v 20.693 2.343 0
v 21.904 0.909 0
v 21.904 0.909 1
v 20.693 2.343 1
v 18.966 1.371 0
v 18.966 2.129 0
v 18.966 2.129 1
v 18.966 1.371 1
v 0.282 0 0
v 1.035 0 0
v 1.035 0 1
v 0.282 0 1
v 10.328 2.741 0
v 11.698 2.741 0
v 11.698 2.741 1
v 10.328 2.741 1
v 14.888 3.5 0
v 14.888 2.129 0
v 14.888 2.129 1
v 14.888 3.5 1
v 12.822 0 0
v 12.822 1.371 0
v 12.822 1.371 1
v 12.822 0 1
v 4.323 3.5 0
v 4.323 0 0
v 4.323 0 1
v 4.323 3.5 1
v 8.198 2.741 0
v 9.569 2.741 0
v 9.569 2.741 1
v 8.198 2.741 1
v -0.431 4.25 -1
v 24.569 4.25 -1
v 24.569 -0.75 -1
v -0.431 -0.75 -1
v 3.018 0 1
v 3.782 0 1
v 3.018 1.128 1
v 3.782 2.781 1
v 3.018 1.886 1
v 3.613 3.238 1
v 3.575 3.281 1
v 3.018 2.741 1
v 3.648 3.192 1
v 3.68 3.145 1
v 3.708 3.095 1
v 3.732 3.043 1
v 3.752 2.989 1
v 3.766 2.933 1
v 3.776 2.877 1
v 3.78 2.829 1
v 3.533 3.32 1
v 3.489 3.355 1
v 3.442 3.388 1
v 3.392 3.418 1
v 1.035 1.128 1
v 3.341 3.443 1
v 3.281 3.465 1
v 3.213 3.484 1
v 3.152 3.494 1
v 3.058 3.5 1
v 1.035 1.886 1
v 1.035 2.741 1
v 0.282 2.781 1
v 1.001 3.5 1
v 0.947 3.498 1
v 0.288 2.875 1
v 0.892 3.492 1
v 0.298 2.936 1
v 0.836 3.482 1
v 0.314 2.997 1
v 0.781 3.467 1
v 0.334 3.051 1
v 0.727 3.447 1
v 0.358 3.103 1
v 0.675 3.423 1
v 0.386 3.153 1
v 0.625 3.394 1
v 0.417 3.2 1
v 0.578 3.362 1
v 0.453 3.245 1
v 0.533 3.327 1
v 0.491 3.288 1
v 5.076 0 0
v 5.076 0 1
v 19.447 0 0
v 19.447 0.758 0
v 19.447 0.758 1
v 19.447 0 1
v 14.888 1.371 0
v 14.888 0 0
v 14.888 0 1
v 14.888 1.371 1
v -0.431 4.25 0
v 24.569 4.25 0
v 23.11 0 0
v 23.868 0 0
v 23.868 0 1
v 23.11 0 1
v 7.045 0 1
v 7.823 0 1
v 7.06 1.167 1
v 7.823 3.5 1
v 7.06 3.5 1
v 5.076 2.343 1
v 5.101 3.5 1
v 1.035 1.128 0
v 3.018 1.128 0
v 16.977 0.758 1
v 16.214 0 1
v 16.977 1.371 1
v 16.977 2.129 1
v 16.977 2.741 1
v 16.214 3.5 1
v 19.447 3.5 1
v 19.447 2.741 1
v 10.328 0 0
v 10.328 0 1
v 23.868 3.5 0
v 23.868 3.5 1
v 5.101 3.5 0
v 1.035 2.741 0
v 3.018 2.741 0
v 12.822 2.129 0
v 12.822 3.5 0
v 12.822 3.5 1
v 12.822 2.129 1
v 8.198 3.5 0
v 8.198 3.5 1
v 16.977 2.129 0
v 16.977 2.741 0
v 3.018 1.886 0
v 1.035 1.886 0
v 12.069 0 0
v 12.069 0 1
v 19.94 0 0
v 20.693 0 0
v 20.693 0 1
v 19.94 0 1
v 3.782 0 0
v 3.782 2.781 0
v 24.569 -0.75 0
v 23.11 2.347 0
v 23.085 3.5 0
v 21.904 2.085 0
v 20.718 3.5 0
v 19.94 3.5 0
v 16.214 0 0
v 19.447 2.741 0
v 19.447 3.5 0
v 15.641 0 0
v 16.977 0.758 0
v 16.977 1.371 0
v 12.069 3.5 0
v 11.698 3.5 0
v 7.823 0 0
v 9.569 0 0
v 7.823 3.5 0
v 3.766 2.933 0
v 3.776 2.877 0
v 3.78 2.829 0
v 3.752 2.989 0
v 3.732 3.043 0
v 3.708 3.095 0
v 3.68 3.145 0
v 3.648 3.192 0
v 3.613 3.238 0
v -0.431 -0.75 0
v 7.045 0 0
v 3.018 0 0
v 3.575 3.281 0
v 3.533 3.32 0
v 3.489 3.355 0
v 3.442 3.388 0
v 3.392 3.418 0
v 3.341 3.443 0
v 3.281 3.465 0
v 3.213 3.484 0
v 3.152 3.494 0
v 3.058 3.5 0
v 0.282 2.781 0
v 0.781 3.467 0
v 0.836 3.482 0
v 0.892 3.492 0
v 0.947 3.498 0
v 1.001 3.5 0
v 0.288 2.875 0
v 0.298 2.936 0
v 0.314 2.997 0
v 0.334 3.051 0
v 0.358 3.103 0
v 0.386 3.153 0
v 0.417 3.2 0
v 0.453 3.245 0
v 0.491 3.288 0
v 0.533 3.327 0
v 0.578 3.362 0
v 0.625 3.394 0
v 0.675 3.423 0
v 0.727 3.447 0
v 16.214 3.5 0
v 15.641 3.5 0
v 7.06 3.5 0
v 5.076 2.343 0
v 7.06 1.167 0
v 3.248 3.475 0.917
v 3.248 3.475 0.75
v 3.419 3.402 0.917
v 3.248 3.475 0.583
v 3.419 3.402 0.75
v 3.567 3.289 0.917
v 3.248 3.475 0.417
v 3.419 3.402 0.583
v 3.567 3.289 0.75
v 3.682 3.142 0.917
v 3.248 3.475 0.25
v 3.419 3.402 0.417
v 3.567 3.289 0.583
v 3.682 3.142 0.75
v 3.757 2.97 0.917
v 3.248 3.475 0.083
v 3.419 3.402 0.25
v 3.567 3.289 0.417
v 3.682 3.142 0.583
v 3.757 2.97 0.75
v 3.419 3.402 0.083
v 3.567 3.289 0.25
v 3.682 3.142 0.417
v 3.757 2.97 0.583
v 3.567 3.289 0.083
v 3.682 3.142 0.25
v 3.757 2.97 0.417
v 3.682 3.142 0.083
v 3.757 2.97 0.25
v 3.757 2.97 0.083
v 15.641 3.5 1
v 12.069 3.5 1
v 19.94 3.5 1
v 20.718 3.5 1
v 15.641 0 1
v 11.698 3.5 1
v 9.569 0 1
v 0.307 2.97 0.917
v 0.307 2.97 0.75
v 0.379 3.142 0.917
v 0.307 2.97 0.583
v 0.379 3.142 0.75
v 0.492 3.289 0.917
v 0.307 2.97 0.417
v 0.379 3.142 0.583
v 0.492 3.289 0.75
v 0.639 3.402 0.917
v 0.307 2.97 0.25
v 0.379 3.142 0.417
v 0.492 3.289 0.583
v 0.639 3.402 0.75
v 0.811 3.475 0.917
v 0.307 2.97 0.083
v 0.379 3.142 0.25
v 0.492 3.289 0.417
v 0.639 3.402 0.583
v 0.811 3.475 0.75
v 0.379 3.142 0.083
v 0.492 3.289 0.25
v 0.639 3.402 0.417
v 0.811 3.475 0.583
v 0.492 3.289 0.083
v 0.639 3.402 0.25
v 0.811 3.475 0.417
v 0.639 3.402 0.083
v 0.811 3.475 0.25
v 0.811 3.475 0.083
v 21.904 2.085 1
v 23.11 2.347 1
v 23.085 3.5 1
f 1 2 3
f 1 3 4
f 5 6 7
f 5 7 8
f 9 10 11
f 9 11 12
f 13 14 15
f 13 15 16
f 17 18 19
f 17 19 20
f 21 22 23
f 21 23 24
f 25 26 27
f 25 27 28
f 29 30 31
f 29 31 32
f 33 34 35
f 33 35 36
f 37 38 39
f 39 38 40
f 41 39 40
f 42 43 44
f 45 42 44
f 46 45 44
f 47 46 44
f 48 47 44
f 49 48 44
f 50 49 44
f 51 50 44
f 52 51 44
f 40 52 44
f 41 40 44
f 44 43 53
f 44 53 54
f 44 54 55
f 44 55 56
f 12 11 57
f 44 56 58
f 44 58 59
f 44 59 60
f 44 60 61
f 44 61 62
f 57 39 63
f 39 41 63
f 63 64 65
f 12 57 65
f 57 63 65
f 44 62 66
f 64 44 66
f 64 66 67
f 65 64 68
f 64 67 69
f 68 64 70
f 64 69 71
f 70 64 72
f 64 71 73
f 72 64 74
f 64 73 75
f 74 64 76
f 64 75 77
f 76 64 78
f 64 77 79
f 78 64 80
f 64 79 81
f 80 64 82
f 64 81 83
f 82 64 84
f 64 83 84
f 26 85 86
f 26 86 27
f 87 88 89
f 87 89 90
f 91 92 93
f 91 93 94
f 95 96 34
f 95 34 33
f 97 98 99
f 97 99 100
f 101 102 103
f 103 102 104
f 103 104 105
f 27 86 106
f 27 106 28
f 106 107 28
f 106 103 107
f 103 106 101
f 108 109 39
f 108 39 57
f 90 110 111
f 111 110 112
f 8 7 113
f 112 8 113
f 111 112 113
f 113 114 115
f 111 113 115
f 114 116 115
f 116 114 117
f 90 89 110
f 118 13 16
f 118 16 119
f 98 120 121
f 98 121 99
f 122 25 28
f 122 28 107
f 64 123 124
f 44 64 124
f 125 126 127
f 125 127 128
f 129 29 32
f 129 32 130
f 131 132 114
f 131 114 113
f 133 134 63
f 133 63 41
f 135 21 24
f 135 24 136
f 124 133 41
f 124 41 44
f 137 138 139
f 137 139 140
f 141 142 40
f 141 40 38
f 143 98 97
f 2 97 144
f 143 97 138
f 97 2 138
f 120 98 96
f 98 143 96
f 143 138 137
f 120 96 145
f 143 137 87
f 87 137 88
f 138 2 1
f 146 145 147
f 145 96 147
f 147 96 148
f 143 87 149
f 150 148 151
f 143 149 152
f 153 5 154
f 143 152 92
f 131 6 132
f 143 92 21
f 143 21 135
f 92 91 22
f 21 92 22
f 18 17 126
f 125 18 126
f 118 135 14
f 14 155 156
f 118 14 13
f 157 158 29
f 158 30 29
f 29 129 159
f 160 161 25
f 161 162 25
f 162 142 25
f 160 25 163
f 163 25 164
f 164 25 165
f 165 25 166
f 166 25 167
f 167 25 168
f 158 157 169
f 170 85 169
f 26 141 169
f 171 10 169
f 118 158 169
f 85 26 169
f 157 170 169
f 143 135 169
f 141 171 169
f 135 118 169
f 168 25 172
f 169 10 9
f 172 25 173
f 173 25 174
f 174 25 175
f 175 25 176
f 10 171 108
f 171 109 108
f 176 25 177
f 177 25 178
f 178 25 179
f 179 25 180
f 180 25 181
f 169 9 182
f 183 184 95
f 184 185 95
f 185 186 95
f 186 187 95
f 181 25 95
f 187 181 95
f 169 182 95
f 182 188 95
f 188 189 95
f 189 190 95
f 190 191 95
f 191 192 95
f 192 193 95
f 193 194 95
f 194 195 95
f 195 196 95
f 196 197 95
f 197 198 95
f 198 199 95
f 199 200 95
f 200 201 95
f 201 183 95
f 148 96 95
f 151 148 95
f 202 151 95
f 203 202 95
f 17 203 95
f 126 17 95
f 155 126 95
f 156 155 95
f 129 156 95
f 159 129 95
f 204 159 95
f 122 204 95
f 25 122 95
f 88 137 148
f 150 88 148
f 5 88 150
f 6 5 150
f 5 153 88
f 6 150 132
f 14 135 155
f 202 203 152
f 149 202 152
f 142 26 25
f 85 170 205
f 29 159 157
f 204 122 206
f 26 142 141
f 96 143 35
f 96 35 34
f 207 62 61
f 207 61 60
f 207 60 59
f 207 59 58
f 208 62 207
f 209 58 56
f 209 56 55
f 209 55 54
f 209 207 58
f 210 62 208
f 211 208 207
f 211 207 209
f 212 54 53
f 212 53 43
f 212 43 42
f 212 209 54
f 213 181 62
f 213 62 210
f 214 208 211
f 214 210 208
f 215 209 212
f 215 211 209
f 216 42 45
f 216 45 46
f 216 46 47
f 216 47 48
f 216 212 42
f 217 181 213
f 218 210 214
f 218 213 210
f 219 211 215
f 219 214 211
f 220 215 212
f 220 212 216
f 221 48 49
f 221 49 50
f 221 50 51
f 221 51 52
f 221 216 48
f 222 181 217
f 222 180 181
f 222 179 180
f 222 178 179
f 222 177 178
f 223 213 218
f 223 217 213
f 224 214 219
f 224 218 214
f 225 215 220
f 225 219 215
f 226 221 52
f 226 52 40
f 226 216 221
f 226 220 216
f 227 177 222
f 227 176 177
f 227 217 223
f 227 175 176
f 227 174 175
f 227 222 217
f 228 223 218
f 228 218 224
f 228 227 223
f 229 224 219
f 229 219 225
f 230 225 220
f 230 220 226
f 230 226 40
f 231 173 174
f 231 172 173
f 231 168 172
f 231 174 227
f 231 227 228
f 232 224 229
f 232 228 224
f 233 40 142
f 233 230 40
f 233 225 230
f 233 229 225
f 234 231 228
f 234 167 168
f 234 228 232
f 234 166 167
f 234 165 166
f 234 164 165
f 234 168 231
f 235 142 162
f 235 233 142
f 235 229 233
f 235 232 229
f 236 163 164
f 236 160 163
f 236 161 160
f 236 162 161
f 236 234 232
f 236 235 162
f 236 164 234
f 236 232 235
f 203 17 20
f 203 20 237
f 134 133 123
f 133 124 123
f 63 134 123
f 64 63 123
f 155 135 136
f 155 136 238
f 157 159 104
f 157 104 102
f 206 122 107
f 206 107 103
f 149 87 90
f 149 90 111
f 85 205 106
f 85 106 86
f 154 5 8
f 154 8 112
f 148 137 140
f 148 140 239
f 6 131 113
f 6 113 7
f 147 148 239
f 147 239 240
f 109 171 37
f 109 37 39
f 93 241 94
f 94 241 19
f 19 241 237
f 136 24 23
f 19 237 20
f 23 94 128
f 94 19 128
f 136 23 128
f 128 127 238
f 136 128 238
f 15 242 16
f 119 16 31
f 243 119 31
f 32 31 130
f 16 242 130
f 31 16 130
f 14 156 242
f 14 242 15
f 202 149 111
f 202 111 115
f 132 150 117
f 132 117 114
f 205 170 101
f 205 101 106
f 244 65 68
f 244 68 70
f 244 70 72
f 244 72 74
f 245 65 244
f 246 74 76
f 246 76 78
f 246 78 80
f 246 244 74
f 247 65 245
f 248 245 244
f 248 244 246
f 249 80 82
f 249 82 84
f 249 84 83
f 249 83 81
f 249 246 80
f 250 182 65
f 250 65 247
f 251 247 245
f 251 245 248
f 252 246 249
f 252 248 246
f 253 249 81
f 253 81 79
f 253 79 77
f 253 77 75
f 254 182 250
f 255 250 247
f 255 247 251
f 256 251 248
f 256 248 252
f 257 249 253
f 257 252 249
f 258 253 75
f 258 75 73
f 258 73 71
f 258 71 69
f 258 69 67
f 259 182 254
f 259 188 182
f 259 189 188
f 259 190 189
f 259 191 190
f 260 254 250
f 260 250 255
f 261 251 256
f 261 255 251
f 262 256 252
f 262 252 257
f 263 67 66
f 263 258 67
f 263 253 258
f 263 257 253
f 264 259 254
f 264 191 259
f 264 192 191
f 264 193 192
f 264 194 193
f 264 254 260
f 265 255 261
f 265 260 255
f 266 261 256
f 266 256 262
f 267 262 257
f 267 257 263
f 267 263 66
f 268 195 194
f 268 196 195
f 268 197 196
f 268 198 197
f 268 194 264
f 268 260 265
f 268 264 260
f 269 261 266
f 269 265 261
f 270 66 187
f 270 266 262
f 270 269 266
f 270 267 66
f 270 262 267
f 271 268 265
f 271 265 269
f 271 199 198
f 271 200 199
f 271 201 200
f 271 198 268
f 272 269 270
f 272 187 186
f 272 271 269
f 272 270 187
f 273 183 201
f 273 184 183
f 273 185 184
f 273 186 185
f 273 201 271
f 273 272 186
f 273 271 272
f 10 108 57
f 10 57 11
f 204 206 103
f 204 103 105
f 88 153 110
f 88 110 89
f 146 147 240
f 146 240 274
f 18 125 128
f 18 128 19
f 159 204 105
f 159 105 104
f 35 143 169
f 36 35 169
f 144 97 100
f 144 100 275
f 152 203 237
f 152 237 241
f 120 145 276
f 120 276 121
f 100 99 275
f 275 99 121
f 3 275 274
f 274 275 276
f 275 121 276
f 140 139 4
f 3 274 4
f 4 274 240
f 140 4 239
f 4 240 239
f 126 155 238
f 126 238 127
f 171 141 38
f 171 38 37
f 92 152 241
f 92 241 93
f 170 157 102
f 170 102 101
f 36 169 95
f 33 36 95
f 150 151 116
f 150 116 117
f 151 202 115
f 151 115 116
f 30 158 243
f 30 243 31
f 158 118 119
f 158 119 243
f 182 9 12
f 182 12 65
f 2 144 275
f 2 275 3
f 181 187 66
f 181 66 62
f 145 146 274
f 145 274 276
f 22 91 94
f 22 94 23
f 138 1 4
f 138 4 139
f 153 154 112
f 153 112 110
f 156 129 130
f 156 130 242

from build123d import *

# Parameters (mm, degrees)
SKETCH1_W             = 1.983122363
SKETCH1_H             = 0.855133615
BOSS_EXTRUDE1_DEPTH   = 1
BOSS_EXTRUDE1_2_DEPTH = 1
BOSS_EXTRUDE1_3_DEPTH = 1
BOSS_EXTRUDE1_4_DEPTH = 1
BOSS_EXTRUDE1_5_DEPTH = 1
BOSS_EXTRUDE1_6_DEPTH = 1
SKETCH2_W             = 25
SKETCH2_H             = 5
BOSS_EXTRUDE2_DEPTH   = 1


with BuildPart() as part:
    # Sketch1 → Boss-Extrude1 (new body)
    with BuildSketch(Plane.XY):
        with BuildLine():
            Line((0.281997187, 0), (0.281997187, 2.780590717))
            add(Edge.make_bspline(
                [(0.281997187, 2.780590717), (0.283229244, 2.813026758), (0.285659888, 2.87701767), (0.304480904, 2.970500865), (0.334977853, 3.059415163), (0.377200617, 3.143135369), (0.43021619, 3.220013944), (0.490517367, 3.290502947), (0.560613021, 3.351341498), (0.637677118, 3.403898535), (0.721142214, 3.447362774), (0.810633683, 3.477327555), (0.904491397, 3.4964233), (0.968729628, 3.498794045), (1.00140647, 3.5)],
                knots=[0, 0, 0, 0, 1.032830424, 2.037602572, 3.024846489, 4.020164832, 5.014473951, 5.993861653, 6.967623515, 7.961932634, 8.960635615, 9.954944734, 10.959716882, 12, 12, 12, 12], degree=3))
            Line((1.00140647, 3.5), (3.05766526, 3.5))
            add(Edge.make_bspline(
                [(3.05766526, 3.5), (3.090103466, 3.498772386), (3.154098648, 3.496350507), (3.247550665, 3.477465492), (3.336681955, 3.447172624), (3.420051858, 3.403984292), (3.497130942, 3.350888644), (3.568573893, 3.290836996), (3.629457878, 3.219800158), (3.684008122, 3.143247784), (3.727453764, 3.059458406), (3.75985444, 2.970775725), (3.778237993, 2.876986116), (3.780732672, 2.813016144), (3.781997187, 2.780590717)],
                knots=[0, 0, 0, 0, 1.0309459, 2.033884719, 3.019327289, 4.016208014, 5.008702895, 5.991943608, 6.974449273, 7.975419069, 8.975722404, 9.966115281, 10.9690541, 12, 12, 12, 12], degree=3))
            Line((3.781997187, 2.780590717), (3.781997187, 0))
            Line((3.781997187, 0), (3.018284107, 0))
            Line((3.018284107, 0), (3.018284107, 1.127988748))
            Line((3.018284107, 1.127988748), (1.035161744, 1.127988748))
            Line((1.035161744, 1.127988748), (1.035161744, 0))
            Line((1.035161744, 0), (0.281997187, 0))
        make_face()
        with Locations((2.026722926, 2.313642757)):
            Rectangle(SKETCH1_W, SKETCH1_H, mode=Mode.SUBTRACT)
    extrude(amount=BOSS_EXTRUDE1_DEPTH)



with BuildPart() as body_2:
    # Sketch1 → Boss-Extrude1 2 (new body)
    with BuildSketch(Plane.XY):
        Polygon((4.32278481, 0), (4.32278481, 3.5), (5.100562588, 3.5), (7.059774965, 1.166666667), (7.059774965, 3.5), (7.82278481, 3.5), (7.82278481, 0), (7.045007032, 0), (5.075949367, 2.343178622), (5.075949367, 0), align=None)
    extrude(amount=BOSS_EXTRUDE1_2_DEPTH)


with BuildPart() as body_3:
    # Sketch1 → Boss-Extrude1 3 (new body)
    with BuildSketch(Plane.XY):
        Polygon((9.568917018, 0), (9.568917018, 2.741209564), (8.198312236, 2.741209564), (8.198312236, 3.5), (11.698312236, 3.5), (11.698312236, 2.741209564), (10.327707454, 2.741209564), (10.327707454, 0), align=None)
    extrude(amount=BOSS_EXTRUDE1_3_DEPTH)


with BuildPart() as body_4:
    # Sketch1 → Boss-Extrude1 4 (new body)
    with BuildSketch(Plane.XY):
        Polygon((12.068917018, 0), (12.068917018, 3.5), (12.822081575, 3.5), (12.822081575, 2.128691983), (14.888185654, 2.128691983), (14.888185654, 3.5), (15.641350211, 3.5), (15.641350211, 0), (14.888185654, 0), (14.888185654, 1.370604782), (12.822081575, 1.370604782), (12.822081575, 0), align=None)
    extrude(amount=BOSS_EXTRUDE1_4_DEPTH)


with BuildPart() as body_5:
    # Sketch1 → Boss-Extrude1 5 (new body)
    with BuildSketch(Plane.XY):
        Polygon((16.214486639, 0), (16.214486639, 3.5), (19.446554149, 3.5), (19.446554149, 2.741209564), (16.977496484, 2.741209564), (16.977496484, 2.128691983), (18.965541491, 2.128691983), (18.965541491, 1.370604782), (16.977496484, 1.370604782), (16.977496484, 0.758087201), (19.446554149, 0.758087201), (19.446554149, 0), align=None)
    extrude(amount=BOSS_EXTRUDE1_5_DEPTH)


with BuildPart() as body_6:
    # Sketch1 → Boss-Extrude1 6 (new body)
    with BuildSketch(Plane.XY):
        Polygon((19.940225035, 0), (19.940225035, 3.5), (20.718002813, 3.5), (21.904360056, 2.085091421), (23.085091421, 3.5), (23.867791842, 3.5), (23.867791842, 0), (23.109704641, 0), (23.109704641, 2.347398031), (21.904360056, 0.9092827), (20.693389592, 2.343178622), (20.693389592, 0), align=None)
    extrude(amount=BOSS_EXTRUDE1_6_DEPTH)


with BuildPart() as part_1:
    add(part.part)

    add(body_2.part)  # Boss-Extrude2 merges body 2

    add(body_3.part)  # Boss-Extrude2 merges body 3

    add(body_4.part)  # Boss-Extrude2 merges body 4

    add(body_5.part)  # Boss-Extrude2 merges body 5

    add(body_6.part)  # Boss-Extrude2 merges body 6
    # Sketch2 → Boss-Extrude2 (add)
    with BuildSketch(Plane(origin=(0, 0, 0), x_dir=(-1, 0, 0), z_dir=(0, 0, -1))):
        with Locations((-12.068917018, 1.75)):
            Rectangle(SKETCH2_W, SKETCH2_H)
    extrude(amount=BOSS_EXTRUDE2_DEPTH)


solid = part_1.part
